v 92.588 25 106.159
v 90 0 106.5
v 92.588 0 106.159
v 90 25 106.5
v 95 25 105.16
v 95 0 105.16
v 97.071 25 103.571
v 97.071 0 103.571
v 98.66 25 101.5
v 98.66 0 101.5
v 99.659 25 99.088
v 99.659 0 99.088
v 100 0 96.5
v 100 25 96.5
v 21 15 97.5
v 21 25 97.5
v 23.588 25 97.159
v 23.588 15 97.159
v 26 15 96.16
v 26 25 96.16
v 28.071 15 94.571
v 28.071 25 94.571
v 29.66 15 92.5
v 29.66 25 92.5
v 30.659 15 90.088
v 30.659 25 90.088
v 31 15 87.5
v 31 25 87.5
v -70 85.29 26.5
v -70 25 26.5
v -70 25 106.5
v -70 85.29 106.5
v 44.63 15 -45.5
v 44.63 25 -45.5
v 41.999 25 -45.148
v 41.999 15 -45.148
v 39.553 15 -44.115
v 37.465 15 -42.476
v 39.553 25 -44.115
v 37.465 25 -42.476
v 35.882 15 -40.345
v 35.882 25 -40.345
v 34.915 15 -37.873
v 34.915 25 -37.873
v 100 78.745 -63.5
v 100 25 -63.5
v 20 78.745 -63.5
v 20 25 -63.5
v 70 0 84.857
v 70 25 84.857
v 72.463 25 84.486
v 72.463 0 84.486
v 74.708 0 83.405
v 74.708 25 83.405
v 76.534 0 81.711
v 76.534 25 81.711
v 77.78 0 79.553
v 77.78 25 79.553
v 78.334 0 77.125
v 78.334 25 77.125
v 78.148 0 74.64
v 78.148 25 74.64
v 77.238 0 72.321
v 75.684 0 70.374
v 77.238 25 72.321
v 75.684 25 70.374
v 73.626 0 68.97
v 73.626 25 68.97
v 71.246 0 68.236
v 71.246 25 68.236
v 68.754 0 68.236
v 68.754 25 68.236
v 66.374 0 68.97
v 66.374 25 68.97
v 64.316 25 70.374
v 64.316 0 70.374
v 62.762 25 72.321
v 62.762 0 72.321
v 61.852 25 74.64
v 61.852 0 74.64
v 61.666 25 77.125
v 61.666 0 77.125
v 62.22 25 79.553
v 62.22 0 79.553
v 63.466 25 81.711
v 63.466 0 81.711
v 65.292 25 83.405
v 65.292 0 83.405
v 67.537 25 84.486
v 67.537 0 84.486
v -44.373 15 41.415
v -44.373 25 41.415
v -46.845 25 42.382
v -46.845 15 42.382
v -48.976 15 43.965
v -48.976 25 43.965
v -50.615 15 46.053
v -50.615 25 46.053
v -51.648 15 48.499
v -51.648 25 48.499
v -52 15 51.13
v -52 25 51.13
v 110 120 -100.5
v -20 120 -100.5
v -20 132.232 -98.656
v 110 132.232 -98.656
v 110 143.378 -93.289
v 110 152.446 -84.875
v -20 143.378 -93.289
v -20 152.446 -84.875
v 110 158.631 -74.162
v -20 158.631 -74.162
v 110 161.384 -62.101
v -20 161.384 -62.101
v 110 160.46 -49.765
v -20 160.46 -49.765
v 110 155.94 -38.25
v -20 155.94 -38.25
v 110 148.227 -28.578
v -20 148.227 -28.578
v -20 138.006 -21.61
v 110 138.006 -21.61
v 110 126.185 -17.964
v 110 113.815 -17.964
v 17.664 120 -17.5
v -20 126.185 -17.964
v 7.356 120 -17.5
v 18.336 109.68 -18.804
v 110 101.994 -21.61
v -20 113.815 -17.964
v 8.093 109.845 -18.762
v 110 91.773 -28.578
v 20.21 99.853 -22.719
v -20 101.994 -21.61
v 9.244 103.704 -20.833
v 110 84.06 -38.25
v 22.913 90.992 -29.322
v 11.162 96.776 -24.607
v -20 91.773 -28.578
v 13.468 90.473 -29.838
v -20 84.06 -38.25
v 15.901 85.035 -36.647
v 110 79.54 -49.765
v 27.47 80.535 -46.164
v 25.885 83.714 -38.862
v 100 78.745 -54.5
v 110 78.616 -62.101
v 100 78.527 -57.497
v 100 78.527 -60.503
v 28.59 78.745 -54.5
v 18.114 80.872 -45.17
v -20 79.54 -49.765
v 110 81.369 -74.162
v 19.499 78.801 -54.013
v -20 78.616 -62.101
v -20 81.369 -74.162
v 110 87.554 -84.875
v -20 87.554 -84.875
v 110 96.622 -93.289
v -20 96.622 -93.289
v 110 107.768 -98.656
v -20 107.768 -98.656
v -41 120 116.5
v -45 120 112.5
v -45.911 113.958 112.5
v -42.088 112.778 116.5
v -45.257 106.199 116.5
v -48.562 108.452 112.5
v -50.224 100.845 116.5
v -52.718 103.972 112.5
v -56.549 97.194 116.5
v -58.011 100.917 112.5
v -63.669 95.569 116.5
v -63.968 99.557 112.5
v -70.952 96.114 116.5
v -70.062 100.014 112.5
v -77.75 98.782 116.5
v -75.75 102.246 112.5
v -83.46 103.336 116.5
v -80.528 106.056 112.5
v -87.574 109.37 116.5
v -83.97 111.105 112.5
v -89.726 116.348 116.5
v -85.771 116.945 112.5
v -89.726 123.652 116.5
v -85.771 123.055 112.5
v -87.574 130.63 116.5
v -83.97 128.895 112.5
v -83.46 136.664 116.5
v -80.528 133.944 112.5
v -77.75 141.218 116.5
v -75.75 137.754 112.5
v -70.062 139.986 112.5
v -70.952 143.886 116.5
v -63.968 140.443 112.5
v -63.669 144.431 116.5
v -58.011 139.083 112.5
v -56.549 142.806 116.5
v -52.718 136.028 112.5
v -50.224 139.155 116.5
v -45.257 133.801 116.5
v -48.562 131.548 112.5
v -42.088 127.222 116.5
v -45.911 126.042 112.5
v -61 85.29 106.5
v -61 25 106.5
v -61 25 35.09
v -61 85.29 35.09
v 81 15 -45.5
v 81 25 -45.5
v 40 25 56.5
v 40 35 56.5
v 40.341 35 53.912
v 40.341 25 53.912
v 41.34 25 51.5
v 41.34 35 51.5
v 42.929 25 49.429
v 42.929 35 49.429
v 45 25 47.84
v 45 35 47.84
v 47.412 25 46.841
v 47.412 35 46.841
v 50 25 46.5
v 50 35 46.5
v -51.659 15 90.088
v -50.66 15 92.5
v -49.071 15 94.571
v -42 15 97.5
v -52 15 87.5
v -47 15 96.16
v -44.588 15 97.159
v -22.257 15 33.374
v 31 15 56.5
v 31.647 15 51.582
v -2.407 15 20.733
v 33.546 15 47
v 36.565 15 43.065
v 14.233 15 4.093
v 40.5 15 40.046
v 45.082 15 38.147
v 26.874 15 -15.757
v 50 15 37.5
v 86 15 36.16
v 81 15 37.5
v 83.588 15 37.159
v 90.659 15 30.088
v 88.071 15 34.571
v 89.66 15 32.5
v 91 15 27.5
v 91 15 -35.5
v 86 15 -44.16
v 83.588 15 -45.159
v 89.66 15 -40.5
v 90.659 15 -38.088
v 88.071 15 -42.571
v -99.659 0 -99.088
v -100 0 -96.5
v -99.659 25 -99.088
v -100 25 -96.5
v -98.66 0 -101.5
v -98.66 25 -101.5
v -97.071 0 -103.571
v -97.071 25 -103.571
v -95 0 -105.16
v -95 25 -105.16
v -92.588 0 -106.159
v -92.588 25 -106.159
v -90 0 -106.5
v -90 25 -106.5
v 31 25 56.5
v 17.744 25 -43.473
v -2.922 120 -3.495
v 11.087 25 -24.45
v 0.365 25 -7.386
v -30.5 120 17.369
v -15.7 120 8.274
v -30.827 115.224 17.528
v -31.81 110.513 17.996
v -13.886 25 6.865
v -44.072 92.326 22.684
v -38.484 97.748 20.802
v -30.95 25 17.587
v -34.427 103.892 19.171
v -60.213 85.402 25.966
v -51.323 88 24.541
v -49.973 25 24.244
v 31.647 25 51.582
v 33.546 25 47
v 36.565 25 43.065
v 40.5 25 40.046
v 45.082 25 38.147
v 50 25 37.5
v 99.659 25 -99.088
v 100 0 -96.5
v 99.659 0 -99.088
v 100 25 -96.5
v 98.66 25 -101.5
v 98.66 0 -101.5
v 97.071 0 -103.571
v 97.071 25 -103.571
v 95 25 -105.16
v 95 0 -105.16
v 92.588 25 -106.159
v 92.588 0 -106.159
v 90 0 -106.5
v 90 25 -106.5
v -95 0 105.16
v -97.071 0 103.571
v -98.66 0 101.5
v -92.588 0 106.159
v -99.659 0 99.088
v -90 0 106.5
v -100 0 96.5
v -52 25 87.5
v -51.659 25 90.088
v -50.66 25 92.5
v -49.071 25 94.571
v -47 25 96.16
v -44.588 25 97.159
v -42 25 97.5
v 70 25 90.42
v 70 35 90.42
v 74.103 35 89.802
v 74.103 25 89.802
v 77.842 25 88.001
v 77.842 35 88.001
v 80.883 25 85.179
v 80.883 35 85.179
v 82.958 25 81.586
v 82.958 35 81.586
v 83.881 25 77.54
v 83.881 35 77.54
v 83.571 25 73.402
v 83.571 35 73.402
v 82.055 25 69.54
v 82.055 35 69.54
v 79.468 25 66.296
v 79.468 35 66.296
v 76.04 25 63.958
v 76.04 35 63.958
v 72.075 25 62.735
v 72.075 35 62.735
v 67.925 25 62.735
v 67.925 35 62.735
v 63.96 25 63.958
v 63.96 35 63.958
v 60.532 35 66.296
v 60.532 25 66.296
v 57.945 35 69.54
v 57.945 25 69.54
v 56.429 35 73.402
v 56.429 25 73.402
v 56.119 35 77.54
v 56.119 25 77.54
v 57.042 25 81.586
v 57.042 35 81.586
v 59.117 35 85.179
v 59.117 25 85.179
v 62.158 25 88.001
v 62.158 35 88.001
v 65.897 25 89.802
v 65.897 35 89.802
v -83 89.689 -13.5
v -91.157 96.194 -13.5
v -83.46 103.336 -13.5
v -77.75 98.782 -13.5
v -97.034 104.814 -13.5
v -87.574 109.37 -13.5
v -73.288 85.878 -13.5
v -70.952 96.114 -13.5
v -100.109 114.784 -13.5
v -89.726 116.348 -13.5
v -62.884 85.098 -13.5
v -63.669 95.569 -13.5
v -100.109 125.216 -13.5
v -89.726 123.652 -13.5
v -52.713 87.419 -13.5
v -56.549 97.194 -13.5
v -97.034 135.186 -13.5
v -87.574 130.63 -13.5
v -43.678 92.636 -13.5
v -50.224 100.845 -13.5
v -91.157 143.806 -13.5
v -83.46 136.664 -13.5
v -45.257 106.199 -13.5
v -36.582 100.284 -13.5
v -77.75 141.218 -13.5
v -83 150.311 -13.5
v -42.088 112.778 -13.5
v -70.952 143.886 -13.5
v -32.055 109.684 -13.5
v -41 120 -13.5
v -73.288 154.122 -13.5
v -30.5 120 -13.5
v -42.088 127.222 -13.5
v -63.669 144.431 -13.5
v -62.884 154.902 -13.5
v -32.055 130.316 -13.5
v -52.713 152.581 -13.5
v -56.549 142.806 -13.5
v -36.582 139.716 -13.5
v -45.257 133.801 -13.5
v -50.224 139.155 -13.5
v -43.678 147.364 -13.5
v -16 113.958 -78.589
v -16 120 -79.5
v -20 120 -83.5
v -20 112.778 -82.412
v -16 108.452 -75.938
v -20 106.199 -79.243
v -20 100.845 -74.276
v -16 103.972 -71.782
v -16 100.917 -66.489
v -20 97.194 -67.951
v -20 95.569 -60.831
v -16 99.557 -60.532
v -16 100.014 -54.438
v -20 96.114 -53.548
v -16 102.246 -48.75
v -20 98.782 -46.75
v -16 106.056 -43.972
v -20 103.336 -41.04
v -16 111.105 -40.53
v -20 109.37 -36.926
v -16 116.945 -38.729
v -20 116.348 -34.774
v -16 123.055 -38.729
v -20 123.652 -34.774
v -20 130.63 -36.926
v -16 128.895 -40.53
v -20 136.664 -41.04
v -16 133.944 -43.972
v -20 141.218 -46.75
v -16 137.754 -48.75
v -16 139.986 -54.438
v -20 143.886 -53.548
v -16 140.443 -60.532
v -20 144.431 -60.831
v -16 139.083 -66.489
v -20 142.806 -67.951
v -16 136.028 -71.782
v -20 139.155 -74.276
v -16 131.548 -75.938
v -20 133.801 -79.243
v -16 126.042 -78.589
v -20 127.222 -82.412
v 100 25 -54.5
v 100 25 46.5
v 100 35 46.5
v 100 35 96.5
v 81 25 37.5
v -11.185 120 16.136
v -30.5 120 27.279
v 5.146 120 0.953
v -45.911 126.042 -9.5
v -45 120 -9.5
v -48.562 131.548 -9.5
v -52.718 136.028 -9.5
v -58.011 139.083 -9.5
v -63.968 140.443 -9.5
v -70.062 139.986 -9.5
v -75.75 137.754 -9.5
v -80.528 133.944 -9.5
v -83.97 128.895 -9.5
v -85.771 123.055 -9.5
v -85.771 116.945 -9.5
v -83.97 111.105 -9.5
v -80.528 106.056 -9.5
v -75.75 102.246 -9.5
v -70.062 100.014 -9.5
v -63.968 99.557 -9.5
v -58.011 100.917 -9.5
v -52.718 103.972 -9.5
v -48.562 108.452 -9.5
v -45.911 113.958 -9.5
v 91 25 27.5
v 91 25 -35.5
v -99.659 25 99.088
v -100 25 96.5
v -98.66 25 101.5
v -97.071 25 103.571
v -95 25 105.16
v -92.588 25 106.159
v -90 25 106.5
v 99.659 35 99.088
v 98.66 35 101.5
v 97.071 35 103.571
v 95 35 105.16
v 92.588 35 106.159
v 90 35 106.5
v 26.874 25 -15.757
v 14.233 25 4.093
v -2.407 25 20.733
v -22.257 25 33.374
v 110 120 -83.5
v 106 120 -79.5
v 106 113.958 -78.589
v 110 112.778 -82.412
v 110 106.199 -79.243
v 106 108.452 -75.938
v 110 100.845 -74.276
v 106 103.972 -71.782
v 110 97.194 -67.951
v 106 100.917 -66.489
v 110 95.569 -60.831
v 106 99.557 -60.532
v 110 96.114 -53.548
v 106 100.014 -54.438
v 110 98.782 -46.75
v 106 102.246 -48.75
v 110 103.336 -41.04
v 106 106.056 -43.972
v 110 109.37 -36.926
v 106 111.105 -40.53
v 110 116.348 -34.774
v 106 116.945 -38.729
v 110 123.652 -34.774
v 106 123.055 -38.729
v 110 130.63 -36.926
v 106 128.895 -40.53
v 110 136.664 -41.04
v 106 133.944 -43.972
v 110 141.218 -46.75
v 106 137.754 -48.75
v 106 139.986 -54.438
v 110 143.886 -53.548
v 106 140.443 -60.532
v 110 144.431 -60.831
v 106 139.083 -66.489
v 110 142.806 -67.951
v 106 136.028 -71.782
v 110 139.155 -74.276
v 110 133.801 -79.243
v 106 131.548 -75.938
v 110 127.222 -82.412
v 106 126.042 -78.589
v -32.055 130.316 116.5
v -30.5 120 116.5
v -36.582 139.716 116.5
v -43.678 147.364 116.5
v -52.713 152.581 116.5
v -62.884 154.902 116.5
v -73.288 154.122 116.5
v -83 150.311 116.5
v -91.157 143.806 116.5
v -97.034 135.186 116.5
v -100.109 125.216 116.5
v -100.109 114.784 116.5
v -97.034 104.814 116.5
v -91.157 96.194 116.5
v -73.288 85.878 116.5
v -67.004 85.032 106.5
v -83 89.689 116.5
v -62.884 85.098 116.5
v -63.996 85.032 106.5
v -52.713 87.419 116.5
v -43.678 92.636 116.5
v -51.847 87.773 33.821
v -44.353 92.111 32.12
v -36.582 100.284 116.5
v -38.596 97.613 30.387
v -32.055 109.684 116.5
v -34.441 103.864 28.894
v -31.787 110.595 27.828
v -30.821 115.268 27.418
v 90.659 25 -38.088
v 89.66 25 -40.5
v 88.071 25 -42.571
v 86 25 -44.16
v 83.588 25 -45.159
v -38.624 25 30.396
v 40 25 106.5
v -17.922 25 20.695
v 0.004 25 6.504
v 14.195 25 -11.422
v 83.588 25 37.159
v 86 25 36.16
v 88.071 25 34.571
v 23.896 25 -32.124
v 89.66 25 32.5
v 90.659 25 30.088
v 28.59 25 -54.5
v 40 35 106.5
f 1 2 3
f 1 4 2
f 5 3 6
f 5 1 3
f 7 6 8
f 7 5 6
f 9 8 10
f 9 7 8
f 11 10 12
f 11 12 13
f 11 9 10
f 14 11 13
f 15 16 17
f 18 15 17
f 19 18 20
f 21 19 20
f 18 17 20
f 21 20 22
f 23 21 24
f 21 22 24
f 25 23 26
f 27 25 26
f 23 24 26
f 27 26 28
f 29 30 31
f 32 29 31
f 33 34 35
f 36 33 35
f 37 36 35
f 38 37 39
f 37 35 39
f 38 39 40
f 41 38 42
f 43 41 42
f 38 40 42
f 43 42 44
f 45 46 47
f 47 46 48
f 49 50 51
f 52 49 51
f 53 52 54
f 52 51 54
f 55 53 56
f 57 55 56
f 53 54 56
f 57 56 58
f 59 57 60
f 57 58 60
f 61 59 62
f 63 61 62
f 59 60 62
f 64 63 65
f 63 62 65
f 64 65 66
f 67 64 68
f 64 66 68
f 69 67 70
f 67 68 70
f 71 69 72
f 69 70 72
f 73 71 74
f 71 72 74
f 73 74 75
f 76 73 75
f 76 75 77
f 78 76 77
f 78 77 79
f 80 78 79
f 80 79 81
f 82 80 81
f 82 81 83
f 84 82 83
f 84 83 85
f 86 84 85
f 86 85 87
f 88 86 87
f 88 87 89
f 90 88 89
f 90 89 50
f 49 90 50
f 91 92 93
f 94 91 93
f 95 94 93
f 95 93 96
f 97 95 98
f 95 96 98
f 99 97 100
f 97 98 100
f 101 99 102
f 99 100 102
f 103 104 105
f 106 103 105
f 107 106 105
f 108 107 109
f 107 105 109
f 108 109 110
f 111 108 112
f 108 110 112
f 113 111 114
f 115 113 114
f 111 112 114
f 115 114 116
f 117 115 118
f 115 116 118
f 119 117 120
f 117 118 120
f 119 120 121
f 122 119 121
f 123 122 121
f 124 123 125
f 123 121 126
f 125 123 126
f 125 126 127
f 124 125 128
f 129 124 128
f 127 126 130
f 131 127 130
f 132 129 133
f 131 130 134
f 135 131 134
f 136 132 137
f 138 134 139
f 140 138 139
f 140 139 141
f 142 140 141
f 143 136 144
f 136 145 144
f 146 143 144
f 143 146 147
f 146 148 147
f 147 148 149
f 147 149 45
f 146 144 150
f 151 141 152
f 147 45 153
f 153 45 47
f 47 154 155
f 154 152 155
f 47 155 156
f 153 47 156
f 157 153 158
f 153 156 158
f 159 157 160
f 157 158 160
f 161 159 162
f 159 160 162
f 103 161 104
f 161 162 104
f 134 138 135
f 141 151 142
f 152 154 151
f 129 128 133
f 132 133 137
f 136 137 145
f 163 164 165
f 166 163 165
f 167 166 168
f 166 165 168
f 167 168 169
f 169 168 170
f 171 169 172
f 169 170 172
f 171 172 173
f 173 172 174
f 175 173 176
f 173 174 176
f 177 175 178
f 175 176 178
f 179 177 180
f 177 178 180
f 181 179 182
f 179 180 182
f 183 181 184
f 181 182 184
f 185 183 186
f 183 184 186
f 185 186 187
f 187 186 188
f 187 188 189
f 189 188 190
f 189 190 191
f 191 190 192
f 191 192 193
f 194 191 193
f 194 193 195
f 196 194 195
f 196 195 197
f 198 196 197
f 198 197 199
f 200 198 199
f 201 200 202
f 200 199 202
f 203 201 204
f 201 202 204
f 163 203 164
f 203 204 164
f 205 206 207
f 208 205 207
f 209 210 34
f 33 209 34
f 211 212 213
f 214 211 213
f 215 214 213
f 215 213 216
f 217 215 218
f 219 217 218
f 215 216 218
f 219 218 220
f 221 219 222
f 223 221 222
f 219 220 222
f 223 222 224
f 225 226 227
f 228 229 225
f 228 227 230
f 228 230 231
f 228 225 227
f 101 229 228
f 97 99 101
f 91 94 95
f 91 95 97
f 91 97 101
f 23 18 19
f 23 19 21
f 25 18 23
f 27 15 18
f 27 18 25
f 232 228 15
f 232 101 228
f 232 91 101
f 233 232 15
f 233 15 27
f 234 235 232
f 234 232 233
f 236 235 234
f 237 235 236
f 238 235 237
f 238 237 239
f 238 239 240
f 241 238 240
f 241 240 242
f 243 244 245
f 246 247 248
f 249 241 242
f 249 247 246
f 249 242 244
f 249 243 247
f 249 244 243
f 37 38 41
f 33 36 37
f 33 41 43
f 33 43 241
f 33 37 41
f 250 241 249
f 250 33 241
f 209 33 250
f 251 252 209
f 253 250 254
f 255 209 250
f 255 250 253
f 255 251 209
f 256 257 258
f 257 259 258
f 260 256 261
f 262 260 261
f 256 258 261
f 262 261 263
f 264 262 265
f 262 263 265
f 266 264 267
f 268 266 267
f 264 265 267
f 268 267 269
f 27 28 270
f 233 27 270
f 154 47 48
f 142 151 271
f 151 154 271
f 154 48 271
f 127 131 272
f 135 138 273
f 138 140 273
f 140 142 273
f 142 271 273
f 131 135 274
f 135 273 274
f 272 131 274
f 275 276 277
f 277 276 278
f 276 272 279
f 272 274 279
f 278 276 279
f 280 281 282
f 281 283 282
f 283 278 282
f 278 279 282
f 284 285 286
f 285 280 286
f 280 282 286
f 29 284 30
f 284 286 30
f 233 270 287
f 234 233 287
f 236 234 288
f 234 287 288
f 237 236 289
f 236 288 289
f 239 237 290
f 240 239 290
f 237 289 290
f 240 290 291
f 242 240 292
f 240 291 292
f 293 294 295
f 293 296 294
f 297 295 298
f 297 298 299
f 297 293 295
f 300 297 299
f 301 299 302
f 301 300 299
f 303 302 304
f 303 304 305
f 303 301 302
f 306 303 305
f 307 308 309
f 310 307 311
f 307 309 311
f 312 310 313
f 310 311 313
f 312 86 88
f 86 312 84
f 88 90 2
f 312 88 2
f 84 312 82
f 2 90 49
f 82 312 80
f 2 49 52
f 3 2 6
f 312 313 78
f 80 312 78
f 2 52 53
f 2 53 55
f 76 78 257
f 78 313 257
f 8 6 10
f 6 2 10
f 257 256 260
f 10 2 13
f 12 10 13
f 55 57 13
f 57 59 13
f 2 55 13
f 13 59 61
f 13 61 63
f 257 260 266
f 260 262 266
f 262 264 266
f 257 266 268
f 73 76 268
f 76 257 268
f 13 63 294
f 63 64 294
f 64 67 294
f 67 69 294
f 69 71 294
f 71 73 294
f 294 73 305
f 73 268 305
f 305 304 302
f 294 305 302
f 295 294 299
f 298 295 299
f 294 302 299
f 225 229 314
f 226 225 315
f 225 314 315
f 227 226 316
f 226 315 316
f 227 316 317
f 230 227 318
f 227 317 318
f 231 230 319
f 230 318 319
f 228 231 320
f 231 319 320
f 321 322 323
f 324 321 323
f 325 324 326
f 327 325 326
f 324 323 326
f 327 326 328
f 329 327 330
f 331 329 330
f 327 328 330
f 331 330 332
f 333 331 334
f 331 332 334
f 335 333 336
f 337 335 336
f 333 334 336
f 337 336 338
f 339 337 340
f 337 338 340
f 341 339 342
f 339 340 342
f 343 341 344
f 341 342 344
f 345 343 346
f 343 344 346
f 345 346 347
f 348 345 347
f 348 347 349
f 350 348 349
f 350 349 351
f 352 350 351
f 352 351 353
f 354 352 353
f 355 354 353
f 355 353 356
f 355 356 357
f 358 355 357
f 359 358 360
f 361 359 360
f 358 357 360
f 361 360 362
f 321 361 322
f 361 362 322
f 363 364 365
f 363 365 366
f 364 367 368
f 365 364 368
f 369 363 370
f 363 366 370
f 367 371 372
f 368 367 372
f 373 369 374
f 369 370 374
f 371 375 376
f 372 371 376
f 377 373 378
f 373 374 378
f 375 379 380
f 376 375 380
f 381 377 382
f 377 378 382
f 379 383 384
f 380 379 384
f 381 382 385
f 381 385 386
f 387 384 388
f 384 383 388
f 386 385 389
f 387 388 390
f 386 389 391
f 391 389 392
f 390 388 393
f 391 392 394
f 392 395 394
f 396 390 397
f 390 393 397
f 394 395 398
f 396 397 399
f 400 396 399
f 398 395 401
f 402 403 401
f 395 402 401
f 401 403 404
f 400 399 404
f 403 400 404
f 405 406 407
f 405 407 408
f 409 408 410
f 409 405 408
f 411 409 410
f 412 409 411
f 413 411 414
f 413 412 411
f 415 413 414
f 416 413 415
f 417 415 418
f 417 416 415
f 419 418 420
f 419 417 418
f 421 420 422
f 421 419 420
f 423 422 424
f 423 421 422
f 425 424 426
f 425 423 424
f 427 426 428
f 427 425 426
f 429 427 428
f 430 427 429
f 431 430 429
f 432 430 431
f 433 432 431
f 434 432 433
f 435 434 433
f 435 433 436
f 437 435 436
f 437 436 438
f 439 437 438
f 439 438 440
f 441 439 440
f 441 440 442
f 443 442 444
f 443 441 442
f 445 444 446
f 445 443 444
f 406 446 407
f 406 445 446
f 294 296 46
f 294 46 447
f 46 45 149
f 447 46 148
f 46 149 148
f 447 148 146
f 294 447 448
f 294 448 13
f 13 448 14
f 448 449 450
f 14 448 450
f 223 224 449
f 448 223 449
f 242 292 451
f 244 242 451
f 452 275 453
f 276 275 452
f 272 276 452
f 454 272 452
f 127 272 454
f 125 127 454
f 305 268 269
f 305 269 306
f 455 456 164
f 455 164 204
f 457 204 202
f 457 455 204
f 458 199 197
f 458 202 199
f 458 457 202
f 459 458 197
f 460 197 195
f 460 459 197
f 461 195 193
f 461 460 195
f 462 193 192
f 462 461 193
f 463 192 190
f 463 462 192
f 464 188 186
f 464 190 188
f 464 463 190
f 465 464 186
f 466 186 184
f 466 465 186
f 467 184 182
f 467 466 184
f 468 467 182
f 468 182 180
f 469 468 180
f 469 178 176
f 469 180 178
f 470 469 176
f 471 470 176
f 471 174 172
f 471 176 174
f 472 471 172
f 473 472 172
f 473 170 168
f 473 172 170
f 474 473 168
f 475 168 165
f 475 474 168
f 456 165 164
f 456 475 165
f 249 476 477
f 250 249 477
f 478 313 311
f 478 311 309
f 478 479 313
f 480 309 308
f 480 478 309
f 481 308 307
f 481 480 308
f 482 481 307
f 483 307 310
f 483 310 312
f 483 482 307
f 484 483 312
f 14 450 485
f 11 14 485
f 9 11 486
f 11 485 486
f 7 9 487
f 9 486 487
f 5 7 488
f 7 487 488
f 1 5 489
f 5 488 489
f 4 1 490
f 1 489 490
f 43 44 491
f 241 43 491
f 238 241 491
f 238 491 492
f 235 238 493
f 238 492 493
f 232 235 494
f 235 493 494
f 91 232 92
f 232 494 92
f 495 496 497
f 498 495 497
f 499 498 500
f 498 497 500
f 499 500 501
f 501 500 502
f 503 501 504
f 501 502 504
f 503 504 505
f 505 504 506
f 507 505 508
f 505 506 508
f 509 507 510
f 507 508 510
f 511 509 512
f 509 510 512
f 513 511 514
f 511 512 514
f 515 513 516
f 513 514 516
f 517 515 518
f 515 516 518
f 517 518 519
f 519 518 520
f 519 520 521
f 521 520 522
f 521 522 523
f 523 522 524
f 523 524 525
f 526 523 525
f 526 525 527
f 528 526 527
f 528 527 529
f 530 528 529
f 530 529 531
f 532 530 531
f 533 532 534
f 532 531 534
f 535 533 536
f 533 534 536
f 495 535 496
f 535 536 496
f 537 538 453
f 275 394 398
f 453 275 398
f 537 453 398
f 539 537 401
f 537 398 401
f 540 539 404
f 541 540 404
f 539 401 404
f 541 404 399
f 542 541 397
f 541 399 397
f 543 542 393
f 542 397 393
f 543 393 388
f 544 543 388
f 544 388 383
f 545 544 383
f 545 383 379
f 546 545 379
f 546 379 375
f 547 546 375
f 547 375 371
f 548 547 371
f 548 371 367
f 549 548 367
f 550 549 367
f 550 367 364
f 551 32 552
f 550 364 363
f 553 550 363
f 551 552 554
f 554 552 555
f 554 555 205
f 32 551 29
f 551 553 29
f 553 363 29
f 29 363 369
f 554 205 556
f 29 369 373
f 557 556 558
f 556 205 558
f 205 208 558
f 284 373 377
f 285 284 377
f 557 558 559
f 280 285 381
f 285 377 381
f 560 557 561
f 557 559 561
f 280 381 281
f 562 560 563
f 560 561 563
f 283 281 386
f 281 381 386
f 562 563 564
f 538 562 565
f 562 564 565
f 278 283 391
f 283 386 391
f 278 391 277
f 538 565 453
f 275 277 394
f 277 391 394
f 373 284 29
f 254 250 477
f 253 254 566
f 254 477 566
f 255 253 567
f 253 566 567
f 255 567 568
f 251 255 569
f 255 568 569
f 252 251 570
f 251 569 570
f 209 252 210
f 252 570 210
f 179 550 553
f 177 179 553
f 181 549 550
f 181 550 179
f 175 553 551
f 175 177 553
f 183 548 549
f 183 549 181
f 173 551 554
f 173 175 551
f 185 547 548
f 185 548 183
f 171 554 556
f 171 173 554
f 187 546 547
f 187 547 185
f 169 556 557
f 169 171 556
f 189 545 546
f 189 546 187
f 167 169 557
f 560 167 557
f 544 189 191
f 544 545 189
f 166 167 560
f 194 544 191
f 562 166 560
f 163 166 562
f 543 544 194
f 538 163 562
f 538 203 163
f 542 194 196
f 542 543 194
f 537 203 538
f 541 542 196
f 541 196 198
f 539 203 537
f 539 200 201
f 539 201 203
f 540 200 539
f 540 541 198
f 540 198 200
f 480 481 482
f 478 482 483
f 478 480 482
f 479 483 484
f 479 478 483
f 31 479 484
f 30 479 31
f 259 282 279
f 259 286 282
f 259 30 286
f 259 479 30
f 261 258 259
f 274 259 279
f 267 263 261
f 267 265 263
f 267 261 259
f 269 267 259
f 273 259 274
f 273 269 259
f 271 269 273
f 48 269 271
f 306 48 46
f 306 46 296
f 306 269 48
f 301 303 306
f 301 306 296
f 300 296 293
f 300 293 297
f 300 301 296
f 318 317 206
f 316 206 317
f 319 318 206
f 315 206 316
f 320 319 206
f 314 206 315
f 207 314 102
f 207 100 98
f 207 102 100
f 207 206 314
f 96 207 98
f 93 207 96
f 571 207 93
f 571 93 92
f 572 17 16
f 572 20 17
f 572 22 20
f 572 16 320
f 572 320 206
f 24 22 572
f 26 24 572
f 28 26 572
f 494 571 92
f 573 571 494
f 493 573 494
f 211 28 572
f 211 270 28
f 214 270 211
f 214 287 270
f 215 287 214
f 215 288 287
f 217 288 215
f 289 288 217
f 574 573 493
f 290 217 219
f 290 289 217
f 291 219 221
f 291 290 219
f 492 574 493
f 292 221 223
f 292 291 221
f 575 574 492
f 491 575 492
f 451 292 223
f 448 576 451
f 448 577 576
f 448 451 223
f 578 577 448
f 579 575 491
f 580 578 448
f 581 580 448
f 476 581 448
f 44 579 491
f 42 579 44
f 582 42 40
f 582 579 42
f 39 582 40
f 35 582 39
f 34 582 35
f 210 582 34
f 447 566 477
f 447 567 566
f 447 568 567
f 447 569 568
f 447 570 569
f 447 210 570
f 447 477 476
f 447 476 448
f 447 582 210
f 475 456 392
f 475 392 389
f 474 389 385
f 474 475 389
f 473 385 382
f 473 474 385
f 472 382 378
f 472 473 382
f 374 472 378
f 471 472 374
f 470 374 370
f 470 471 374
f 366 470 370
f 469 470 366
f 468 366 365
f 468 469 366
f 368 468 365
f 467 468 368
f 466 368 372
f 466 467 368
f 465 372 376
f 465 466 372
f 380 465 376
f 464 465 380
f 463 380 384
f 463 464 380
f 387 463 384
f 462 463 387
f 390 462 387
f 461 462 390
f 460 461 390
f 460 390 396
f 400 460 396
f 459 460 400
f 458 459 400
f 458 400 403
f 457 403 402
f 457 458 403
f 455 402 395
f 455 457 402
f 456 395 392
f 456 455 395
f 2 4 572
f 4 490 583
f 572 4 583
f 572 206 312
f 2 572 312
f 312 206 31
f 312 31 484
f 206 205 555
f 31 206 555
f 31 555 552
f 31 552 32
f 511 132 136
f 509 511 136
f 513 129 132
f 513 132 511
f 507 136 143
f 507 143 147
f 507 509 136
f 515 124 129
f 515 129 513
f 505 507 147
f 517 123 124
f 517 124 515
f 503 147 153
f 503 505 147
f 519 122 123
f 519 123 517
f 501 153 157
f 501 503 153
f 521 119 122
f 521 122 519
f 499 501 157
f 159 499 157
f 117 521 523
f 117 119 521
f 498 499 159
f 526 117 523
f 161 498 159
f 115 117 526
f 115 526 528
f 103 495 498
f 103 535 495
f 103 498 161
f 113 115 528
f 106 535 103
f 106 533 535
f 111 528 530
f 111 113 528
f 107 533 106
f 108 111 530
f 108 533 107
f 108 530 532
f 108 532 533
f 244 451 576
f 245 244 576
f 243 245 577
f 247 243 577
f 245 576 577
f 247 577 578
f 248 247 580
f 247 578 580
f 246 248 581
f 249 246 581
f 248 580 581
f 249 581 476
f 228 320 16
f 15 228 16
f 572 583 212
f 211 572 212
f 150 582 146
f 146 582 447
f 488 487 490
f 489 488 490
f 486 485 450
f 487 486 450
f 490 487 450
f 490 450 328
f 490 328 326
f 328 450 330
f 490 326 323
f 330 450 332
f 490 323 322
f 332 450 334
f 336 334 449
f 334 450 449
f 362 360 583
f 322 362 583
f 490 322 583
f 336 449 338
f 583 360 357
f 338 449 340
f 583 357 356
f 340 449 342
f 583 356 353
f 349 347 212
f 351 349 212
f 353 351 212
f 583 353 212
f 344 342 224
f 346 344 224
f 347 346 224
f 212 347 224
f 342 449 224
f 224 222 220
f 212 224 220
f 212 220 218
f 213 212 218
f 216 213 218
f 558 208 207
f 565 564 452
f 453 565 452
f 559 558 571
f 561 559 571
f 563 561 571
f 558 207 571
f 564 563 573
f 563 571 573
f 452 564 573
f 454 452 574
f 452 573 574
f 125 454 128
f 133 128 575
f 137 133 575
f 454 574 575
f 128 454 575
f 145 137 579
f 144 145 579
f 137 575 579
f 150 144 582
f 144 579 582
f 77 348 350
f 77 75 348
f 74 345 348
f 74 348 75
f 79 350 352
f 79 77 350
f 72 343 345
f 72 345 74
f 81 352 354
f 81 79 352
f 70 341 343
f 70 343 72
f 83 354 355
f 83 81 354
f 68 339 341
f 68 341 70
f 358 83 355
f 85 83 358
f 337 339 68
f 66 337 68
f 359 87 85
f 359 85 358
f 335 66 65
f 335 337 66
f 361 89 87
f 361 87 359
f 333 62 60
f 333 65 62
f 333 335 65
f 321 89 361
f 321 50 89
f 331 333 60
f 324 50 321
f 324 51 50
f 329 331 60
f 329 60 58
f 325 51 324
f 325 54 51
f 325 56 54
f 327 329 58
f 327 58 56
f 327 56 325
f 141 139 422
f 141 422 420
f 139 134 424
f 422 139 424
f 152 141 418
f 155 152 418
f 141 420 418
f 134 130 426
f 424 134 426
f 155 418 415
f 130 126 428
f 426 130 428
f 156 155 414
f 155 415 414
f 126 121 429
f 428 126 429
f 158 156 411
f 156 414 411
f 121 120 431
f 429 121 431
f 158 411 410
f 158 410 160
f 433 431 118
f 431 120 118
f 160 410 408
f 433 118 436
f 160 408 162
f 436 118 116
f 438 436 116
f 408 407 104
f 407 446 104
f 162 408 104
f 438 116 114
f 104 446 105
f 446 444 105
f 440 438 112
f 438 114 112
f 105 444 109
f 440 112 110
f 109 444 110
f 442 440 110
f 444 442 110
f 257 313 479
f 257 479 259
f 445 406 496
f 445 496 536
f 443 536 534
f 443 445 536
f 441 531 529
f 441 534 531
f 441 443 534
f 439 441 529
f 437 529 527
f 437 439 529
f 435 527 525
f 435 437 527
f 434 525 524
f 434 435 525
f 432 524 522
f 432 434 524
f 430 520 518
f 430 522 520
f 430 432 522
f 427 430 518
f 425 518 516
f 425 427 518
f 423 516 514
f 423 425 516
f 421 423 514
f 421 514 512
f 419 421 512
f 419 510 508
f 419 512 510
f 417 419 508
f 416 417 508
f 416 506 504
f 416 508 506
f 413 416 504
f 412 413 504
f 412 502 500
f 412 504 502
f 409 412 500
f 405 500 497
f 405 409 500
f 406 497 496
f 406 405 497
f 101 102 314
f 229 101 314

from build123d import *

# Parameters (mm, degrees)
SKETCH1_W                = 200
SKETCH1_H                = 213
BOSS_EXTRUDE1_DEPTH      = 25
FILLET1_R                = 10
BOSS_EXTRUDE2_START      = 10
BOSS_EXTRUDE2_DEPTH      = 10
BOSS_EXTRUDE3_DEPTH      = 95
BOSS_EXTRUDE4_DEPTH      = 10
BOSS_EXTRUDE4_DEPTH_BACK = 120
SKETCH4_R                = 35
CUT_EXTRUDE1_DEPTH       = 290.575983208
CUT_EXTRUDE1_DEPTH_BACK  = 290.575983208
SKETCH6_R                = 20.5
BOSS_EXTRUDE5_DEPTH      = 10
BOSS_EXTRUDE5_DEPTH_BACK = 120
SKETCH7_R                = 41.5
CUT_EXTRUDE2_DEPTH       = 290.766716644
CUT_EXTRUDE2_DEPTH_BACK  = 290.766716644
SKETCH8_R                = 20.5
CHAMFER1_SIZE            = 4
CUT_EXTRUDE3_DEPTH       = 10
SKETCH10_R               = 13.920178612
CUT_EXTRUDE4_DEPTH       = 10
SKETCH11_R               = 8.357374053
CUT_EXTRUDE5_DEPTH       = 211.486341717


with BuildPart() as part:
    # Sketch1 → Boss-Extrude1 (new body)
    with BuildSketch(Plane(origin=(0, 0, 0), x_dir=(1, 0, 0), z_dir=(0, 1, 0))):
        Rectangle(SKETCH1_W, SKETCH1_H)
    extrude(amount=BOSS_EXTRUDE1_DEPTH)

    # Fillet1
    fillet1_edges = [part.edges().sort_by_distance(p)[0] for p in [
        (100, 12.5, 106.5),
        (-100, 12.5, 106.5),
        (-100, 12.5, -106.5),
        (100, 12.5, -106.5),
    ]]
    fillet(fillet1_edges, radius=FILLET1_R)

    # Sketch2 → Boss-Extrude2 (add)
    with BuildSketch(Plane(origin=(0, 25, 0), x_dir=(1, 0, 0), z_dir=(0, 1, 0)).offset(BOSS_EXTRUDE2_START)):
        with BuildLine():
            Line((50, -46.5), (100, -46.5))
            Line((100, -46.5), (100, -96.5))
            ThreePointArc((100, -96.5), (97.071067812, -103.571067812), (90, -106.5))
            Line((90, -106.5), (40, -106.5))
            Line((40, -106.5), (40, -56.5))
            ThreePointArc((40, -56.5), (42.928932188, -49.428932188), (50, -46.5))
        make_face()
    extrude(amount=-BOSS_EXTRUDE2_DEPTH)

    # Sketch3 → Boss-Extrude3 (add)
    with BuildSketch(Plane(origin=(0, 25, 0), x_dir=(1, 0, 0), z_dir=(0, 1, 0))):
        with BuildLine():
            Line((100, 63.5), (20, 63.5))
            ThreePointArc((20, 63.5), (-6.360389693, -0.139610307), (-70, -26.5))
            Line((-70, -26.5), (-70, -106.5))
            Line((-70, -106.5), (-61, -106.5))
            Line((-61, -106.5), (-61, -35.090060351))
            ThreePointArc((-61, -35.090060351), (0.003571337, -6.503571337), (28.590060351, 54.5))
            Line((28.590060351, 54.5), (100, 54.5))
            Line((100, 54.5), (100, 63.5))
        make_face()
    extrude(amount=BOSS_EXTRUDE3_DEPTH)

    # Sketch4 → Boss-Extrude4 (add, two sides: drawn at the far end of the back side and taken through both)
    with BuildSketch(Plane.XY.offset(106.5).offset(-BOSS_EXTRUDE4_DEPTH_BACK)):
        with Locations((-65.5, 120)):
            Circle(SKETCH4_R)
    extrude(amount=BOSS_EXTRUDE4_DEPTH + BOSS_EXTRUDE4_DEPTH_BACK)

    # Sketch6 → Cut-Extrude1 (cut, two sides: drawn at the far end of the back side and taken through both)
    with BuildSketch(Plane.XY.offset(116.5).offset(-CUT_EXTRUDE1_DEPTH_BACK)):
        with Locations((-65.5, 120)):
            Circle(SKETCH6_R)
    extrude(amount=CUT_EXTRUDE1_DEPTH + CUT_EXTRUDE1_DEPTH_BACK, mode=Mode.SUBTRACT)

    # Sketch7 → Boss-Extrude5 (add, two sides: drawn at the far end of the back side and taken through both)
    with BuildSketch(Plane(origin=(100, 0, 0), x_dir=(0, 0, -1), z_dir=(1, 0, 0)).offset(-BOSS_EXTRUDE5_DEPTH_BACK)):
        with Locations((59, 120)):
            Circle(SKETCH7_R)
    extrude(amount=BOSS_EXTRUDE5_DEPTH + BOSS_EXTRUDE5_DEPTH_BACK)

    # Sketch8 → Cut-Extrude2 (cut, two sides: drawn at the far end of the back side and taken through both)
    with BuildSketch(Plane(origin=(110, 0, 0), x_dir=(0, 0, -1), z_dir=(1, 0, 0)).offset(-CUT_EXTRUDE2_DEPTH_BACK)):
        with Locations((59, 120)):
            Circle(SKETCH8_R)
    extrude(amount=CUT_EXTRUDE2_DEPTH + CUT_EXTRUDE2_DEPTH_BACK, mode=Mode.SUBTRACT)

    # Chamfer1
    chamfer1_edges = [part.edges().sort_by_distance(p)[0] for p in [
        (-20, 120, -38.5),
        (110, 120, -38.5),
        (-86, 120, -13.5),
        (-86, 120, 116.5),
    ]]
    chamfer(chamfer1_edges, length=CHAMFER1_SIZE)

    # Sketch9 → Cut-Extrude3 (cut)
    with BuildSketch(Plane(origin=(0, 25, 0), x_dir=(1, 0, 0), z_dir=(0, 1, 0))):
        with BuildLine():
            Line((81, 45.5), (44.629839047, 45.5))
            ThreePointArc((44.629839047, 45.5), (38.454436775, 43.365392983), (34.915445908, 37.872881356))
            ThreePointArc((34.915445908, 37.872881356), (6.367532368, -12.867532368), (-44.372881356, -41.415445908))
            ThreePointArc((-44.372881356, -41.415445908), (-49.865392983, -44.954436775), (-52, -51.129839047))
            Line((-52, -51.129839047), (-52, -87.5))
            ThreePointArc((-52, -87.5), (-49.071067812, -94.571067812), (-42, -97.5))
            Line((-42, -97.5), (21, -97.5))
            ThreePointArc((21, -97.5), (28.071067812, -94.571067812), (31, -87.5))
            Line((31, -87.5), (31, -56.5))
            ThreePointArc((31, -56.5), (36.564971157, -43.064971157), (50, -37.5))
            Line((50, -37.5), (81, -37.5))
            ThreePointArc((81, -37.5), (88.071067812, -34.571067812), (91, -27.5))
            Line((91, -27.5), (91, 35.5))
            ThreePointArc((91, 35.5), (88.071067812, 42.571067812), (81, 45.5))
        make_face()
    extrude(amount=-CUT_EXTRUDE3_DEPTH, mode=Mode.SUBTRACT)

    # Sketch10 → Cut-Extrude4 (cut)
    with BuildSketch(Plane(origin=(0, 35, 0), x_dir=(1, 0, 0), z_dir=(0, 1, 0))):
        with Locations(Location((70, -76.5, 0), (0, 0, 270))):
            Circle(SKETCH10_R)
    extrude(amount=-CUT_EXTRUDE4_DEPTH, mode=Mode.SUBTRACT)

    # Sketch11 → Cut-Extrude5 (cut, through all)
    with BuildSketch(Plane(origin=(0, 25, 0), x_dir=(1, 0, 0), z_dir=(0, 1, 0))):
        with Locations(Location((70, -76.5, 0), (0, 0, 270))):
            Circle(SKETCH11_R)
    extrude(amount=-CUT_EXTRUDE5_DEPTH, mode=Mode.SUBTRACT)


solid = part.part
